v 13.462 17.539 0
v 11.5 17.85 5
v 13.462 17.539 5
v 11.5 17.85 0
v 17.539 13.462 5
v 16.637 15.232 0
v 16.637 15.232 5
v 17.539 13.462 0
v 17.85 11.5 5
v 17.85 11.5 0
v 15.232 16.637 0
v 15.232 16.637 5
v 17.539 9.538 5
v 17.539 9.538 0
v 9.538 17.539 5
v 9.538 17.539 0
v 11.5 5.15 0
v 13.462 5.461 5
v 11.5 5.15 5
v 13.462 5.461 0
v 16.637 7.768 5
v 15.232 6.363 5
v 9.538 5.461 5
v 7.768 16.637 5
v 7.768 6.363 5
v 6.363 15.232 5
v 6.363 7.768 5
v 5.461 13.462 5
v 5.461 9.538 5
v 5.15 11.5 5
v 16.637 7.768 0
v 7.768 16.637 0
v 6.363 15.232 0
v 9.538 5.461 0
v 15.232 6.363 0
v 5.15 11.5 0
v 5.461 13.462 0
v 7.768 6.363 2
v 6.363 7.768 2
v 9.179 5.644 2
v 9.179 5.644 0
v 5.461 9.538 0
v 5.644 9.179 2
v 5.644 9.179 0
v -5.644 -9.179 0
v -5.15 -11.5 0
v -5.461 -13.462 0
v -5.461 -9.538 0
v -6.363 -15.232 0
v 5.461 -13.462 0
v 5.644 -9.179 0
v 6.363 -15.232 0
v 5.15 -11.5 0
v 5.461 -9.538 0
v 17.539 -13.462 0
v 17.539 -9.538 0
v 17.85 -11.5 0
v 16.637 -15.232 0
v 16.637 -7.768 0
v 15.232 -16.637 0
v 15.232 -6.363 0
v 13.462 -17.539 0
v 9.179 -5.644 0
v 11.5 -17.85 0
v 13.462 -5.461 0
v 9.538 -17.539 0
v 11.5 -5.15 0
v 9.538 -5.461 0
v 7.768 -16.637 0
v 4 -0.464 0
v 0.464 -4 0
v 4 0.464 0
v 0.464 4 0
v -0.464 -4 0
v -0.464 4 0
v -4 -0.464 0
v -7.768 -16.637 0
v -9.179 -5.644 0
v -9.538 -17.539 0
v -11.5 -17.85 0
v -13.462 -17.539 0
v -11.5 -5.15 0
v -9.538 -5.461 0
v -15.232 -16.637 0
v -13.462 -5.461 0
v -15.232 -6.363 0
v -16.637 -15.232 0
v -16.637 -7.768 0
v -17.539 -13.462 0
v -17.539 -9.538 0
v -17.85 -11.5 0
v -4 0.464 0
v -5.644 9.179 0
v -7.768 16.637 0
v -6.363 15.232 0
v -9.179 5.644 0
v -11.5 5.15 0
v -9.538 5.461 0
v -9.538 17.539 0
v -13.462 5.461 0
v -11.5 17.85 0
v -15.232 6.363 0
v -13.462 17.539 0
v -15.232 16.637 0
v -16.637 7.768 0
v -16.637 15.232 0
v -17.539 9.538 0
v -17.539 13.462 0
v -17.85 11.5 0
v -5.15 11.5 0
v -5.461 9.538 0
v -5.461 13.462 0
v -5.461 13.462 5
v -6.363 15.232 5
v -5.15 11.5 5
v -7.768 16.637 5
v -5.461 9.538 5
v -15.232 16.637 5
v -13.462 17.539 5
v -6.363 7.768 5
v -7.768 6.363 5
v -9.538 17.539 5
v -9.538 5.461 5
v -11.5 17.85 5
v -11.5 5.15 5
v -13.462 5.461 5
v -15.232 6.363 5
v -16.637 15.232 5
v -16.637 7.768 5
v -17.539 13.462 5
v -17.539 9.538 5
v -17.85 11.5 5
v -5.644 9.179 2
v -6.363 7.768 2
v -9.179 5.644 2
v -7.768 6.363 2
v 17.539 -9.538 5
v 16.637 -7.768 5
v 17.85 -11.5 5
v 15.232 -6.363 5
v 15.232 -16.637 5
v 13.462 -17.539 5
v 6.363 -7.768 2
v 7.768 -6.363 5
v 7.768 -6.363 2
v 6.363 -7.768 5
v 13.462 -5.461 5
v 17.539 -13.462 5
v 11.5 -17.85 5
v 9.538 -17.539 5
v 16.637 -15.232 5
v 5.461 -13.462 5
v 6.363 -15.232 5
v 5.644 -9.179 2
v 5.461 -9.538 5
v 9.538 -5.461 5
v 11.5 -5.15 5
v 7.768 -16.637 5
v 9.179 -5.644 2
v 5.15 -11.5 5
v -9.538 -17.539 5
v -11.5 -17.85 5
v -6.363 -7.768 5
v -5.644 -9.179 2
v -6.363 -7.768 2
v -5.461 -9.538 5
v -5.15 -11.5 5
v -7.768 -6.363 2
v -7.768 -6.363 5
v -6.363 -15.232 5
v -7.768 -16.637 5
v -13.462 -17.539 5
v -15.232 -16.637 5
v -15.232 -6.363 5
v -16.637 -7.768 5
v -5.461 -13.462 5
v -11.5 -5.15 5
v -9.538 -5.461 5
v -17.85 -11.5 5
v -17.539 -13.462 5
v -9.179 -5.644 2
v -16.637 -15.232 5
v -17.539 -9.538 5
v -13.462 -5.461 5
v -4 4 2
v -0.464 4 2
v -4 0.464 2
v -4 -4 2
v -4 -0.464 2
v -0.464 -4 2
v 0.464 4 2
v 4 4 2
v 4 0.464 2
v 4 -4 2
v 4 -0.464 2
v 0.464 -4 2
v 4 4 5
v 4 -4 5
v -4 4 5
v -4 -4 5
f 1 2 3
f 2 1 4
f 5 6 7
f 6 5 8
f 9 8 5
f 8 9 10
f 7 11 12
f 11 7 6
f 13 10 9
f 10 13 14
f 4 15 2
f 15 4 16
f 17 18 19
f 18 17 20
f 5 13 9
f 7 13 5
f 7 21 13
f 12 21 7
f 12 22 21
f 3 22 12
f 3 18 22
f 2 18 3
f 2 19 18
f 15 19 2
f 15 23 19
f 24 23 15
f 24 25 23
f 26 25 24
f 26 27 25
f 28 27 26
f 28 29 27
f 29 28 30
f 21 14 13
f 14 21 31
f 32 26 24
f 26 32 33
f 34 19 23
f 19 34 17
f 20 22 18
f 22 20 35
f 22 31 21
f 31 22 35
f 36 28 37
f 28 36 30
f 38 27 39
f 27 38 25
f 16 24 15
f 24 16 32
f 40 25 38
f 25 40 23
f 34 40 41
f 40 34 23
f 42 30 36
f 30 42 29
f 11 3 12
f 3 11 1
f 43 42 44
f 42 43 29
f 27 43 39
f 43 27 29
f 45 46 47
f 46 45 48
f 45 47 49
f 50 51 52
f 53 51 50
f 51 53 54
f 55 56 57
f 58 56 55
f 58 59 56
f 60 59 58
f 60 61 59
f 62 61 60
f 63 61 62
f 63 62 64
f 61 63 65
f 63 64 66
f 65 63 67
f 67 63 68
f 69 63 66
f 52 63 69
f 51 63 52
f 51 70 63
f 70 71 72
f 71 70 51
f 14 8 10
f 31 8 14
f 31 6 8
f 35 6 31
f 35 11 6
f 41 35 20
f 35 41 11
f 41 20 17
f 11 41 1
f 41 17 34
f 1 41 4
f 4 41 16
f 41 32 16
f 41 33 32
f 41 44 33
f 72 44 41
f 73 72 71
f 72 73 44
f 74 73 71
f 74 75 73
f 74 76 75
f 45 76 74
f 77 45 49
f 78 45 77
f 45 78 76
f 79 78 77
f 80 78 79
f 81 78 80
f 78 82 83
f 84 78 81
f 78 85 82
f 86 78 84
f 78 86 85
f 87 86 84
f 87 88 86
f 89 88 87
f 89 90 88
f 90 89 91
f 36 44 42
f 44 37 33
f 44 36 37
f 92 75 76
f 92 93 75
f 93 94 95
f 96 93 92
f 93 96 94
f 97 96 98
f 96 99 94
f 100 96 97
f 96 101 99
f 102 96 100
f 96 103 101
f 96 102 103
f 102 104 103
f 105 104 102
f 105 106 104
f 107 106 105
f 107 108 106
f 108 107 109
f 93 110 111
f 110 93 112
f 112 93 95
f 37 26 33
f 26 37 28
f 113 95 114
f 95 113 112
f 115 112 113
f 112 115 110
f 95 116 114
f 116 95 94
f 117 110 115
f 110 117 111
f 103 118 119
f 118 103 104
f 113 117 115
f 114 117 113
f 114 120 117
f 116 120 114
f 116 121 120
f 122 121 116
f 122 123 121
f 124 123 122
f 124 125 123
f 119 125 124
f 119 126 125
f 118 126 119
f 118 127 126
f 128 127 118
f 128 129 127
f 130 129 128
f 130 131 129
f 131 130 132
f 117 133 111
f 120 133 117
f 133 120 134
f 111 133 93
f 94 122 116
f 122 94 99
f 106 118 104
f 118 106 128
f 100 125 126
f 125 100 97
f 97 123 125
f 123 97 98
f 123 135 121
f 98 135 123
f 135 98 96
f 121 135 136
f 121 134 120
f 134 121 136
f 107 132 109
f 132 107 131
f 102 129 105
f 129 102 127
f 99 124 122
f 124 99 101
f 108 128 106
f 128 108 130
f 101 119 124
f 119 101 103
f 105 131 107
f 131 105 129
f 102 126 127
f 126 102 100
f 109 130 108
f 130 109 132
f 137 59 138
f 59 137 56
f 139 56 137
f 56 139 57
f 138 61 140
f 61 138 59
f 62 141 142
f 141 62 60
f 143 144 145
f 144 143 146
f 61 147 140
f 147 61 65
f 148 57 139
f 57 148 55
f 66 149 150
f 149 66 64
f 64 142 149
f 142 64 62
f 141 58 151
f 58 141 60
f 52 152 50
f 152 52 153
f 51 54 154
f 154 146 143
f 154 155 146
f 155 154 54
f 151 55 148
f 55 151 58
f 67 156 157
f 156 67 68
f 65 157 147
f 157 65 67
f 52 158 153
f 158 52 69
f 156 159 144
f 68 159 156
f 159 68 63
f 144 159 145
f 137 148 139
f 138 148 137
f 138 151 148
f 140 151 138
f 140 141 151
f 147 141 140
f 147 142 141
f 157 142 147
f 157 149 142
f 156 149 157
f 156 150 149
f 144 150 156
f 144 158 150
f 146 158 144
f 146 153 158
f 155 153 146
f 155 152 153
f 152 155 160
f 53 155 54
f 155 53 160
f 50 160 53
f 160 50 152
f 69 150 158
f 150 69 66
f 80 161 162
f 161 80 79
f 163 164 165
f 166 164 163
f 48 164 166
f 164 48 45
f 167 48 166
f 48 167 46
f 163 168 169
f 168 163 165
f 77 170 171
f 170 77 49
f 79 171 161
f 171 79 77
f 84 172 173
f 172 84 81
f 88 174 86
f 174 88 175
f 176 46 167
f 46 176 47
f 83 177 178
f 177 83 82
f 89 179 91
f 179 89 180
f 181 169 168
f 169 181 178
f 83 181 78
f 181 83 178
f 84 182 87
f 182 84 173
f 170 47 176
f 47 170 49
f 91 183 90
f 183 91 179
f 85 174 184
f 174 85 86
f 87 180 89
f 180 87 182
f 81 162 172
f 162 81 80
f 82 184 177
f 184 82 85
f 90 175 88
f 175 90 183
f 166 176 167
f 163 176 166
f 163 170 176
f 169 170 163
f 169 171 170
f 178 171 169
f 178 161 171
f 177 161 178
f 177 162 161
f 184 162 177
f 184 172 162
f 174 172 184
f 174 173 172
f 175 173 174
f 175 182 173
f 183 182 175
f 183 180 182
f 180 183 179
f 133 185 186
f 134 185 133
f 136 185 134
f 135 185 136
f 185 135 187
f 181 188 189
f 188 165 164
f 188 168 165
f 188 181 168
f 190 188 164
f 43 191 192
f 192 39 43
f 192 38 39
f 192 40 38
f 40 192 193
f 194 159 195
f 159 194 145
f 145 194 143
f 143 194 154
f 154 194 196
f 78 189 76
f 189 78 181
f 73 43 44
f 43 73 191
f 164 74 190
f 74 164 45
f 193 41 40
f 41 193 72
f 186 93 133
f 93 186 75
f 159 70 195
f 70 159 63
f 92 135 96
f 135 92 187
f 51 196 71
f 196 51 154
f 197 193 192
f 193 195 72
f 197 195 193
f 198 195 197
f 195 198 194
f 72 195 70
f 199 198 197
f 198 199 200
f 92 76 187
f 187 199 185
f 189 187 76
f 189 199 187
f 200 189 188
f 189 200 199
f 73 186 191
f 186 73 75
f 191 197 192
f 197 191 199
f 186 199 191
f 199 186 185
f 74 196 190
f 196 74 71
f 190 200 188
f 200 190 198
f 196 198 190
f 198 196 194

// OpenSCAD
PROP_SIZE = 12.7;  // 5 inch
PROP_HEIGHT = 5.0;

FRAME_SIZE = 23.0; // Wheel base
FRAME_SUPPORT_W = 5;
FRAME_SUPPORT_H = 2;

BODY_W = 8.0;
BODY_D = 8.0;
BODY_H = 5.0;

// Props
translate([FRAME_SIZE / 2, FRAME_SIZE / 2, PROP_HEIGHT / 2])
  cylinder(r=PROP_SIZE / 2, h=PROP_HEIGHT, center=true);
translate([-FRAME_SIZE / 2, FRAME_SIZE / 2, PROP_HEIGHT / 2])
  cylinder(r=PROP_SIZE / 2, h=PROP_HEIGHT, center=true);
translate([FRAME_SIZE / 2, -FRAME_SIZE / 2, PROP_HEIGHT / 2])
  cylinder(r=PROP_SIZE / 2, h=PROP_HEIGHT, center=true);
translate([-FRAME_SIZE / 2, -FRAME_SIZE / 2, PROP_HEIGHT / 2])
  cylinder(r=PROP_SIZE / 2, h=PROP_HEIGHT, center=true);

// Frame
translate([0, 0, FRAME_SUPPORT_H / 2])
  rotate(45)
    cube([FRAME_SIZE, FRAME_SUPPORT_W, FRAME_SUPPORT_H], center=true);
translate([0, 0, FRAME_SUPPORT_H / 2])
  rotate(-45)
    cube([FRAME_SIZE, FRAME_SUPPORT_W, FRAME_SUPPORT_H], center=true);

// Body
translate([0, 0, BODY_H / 2])
  cube([BODY_W, BODY_D, BODY_H], center=true);
